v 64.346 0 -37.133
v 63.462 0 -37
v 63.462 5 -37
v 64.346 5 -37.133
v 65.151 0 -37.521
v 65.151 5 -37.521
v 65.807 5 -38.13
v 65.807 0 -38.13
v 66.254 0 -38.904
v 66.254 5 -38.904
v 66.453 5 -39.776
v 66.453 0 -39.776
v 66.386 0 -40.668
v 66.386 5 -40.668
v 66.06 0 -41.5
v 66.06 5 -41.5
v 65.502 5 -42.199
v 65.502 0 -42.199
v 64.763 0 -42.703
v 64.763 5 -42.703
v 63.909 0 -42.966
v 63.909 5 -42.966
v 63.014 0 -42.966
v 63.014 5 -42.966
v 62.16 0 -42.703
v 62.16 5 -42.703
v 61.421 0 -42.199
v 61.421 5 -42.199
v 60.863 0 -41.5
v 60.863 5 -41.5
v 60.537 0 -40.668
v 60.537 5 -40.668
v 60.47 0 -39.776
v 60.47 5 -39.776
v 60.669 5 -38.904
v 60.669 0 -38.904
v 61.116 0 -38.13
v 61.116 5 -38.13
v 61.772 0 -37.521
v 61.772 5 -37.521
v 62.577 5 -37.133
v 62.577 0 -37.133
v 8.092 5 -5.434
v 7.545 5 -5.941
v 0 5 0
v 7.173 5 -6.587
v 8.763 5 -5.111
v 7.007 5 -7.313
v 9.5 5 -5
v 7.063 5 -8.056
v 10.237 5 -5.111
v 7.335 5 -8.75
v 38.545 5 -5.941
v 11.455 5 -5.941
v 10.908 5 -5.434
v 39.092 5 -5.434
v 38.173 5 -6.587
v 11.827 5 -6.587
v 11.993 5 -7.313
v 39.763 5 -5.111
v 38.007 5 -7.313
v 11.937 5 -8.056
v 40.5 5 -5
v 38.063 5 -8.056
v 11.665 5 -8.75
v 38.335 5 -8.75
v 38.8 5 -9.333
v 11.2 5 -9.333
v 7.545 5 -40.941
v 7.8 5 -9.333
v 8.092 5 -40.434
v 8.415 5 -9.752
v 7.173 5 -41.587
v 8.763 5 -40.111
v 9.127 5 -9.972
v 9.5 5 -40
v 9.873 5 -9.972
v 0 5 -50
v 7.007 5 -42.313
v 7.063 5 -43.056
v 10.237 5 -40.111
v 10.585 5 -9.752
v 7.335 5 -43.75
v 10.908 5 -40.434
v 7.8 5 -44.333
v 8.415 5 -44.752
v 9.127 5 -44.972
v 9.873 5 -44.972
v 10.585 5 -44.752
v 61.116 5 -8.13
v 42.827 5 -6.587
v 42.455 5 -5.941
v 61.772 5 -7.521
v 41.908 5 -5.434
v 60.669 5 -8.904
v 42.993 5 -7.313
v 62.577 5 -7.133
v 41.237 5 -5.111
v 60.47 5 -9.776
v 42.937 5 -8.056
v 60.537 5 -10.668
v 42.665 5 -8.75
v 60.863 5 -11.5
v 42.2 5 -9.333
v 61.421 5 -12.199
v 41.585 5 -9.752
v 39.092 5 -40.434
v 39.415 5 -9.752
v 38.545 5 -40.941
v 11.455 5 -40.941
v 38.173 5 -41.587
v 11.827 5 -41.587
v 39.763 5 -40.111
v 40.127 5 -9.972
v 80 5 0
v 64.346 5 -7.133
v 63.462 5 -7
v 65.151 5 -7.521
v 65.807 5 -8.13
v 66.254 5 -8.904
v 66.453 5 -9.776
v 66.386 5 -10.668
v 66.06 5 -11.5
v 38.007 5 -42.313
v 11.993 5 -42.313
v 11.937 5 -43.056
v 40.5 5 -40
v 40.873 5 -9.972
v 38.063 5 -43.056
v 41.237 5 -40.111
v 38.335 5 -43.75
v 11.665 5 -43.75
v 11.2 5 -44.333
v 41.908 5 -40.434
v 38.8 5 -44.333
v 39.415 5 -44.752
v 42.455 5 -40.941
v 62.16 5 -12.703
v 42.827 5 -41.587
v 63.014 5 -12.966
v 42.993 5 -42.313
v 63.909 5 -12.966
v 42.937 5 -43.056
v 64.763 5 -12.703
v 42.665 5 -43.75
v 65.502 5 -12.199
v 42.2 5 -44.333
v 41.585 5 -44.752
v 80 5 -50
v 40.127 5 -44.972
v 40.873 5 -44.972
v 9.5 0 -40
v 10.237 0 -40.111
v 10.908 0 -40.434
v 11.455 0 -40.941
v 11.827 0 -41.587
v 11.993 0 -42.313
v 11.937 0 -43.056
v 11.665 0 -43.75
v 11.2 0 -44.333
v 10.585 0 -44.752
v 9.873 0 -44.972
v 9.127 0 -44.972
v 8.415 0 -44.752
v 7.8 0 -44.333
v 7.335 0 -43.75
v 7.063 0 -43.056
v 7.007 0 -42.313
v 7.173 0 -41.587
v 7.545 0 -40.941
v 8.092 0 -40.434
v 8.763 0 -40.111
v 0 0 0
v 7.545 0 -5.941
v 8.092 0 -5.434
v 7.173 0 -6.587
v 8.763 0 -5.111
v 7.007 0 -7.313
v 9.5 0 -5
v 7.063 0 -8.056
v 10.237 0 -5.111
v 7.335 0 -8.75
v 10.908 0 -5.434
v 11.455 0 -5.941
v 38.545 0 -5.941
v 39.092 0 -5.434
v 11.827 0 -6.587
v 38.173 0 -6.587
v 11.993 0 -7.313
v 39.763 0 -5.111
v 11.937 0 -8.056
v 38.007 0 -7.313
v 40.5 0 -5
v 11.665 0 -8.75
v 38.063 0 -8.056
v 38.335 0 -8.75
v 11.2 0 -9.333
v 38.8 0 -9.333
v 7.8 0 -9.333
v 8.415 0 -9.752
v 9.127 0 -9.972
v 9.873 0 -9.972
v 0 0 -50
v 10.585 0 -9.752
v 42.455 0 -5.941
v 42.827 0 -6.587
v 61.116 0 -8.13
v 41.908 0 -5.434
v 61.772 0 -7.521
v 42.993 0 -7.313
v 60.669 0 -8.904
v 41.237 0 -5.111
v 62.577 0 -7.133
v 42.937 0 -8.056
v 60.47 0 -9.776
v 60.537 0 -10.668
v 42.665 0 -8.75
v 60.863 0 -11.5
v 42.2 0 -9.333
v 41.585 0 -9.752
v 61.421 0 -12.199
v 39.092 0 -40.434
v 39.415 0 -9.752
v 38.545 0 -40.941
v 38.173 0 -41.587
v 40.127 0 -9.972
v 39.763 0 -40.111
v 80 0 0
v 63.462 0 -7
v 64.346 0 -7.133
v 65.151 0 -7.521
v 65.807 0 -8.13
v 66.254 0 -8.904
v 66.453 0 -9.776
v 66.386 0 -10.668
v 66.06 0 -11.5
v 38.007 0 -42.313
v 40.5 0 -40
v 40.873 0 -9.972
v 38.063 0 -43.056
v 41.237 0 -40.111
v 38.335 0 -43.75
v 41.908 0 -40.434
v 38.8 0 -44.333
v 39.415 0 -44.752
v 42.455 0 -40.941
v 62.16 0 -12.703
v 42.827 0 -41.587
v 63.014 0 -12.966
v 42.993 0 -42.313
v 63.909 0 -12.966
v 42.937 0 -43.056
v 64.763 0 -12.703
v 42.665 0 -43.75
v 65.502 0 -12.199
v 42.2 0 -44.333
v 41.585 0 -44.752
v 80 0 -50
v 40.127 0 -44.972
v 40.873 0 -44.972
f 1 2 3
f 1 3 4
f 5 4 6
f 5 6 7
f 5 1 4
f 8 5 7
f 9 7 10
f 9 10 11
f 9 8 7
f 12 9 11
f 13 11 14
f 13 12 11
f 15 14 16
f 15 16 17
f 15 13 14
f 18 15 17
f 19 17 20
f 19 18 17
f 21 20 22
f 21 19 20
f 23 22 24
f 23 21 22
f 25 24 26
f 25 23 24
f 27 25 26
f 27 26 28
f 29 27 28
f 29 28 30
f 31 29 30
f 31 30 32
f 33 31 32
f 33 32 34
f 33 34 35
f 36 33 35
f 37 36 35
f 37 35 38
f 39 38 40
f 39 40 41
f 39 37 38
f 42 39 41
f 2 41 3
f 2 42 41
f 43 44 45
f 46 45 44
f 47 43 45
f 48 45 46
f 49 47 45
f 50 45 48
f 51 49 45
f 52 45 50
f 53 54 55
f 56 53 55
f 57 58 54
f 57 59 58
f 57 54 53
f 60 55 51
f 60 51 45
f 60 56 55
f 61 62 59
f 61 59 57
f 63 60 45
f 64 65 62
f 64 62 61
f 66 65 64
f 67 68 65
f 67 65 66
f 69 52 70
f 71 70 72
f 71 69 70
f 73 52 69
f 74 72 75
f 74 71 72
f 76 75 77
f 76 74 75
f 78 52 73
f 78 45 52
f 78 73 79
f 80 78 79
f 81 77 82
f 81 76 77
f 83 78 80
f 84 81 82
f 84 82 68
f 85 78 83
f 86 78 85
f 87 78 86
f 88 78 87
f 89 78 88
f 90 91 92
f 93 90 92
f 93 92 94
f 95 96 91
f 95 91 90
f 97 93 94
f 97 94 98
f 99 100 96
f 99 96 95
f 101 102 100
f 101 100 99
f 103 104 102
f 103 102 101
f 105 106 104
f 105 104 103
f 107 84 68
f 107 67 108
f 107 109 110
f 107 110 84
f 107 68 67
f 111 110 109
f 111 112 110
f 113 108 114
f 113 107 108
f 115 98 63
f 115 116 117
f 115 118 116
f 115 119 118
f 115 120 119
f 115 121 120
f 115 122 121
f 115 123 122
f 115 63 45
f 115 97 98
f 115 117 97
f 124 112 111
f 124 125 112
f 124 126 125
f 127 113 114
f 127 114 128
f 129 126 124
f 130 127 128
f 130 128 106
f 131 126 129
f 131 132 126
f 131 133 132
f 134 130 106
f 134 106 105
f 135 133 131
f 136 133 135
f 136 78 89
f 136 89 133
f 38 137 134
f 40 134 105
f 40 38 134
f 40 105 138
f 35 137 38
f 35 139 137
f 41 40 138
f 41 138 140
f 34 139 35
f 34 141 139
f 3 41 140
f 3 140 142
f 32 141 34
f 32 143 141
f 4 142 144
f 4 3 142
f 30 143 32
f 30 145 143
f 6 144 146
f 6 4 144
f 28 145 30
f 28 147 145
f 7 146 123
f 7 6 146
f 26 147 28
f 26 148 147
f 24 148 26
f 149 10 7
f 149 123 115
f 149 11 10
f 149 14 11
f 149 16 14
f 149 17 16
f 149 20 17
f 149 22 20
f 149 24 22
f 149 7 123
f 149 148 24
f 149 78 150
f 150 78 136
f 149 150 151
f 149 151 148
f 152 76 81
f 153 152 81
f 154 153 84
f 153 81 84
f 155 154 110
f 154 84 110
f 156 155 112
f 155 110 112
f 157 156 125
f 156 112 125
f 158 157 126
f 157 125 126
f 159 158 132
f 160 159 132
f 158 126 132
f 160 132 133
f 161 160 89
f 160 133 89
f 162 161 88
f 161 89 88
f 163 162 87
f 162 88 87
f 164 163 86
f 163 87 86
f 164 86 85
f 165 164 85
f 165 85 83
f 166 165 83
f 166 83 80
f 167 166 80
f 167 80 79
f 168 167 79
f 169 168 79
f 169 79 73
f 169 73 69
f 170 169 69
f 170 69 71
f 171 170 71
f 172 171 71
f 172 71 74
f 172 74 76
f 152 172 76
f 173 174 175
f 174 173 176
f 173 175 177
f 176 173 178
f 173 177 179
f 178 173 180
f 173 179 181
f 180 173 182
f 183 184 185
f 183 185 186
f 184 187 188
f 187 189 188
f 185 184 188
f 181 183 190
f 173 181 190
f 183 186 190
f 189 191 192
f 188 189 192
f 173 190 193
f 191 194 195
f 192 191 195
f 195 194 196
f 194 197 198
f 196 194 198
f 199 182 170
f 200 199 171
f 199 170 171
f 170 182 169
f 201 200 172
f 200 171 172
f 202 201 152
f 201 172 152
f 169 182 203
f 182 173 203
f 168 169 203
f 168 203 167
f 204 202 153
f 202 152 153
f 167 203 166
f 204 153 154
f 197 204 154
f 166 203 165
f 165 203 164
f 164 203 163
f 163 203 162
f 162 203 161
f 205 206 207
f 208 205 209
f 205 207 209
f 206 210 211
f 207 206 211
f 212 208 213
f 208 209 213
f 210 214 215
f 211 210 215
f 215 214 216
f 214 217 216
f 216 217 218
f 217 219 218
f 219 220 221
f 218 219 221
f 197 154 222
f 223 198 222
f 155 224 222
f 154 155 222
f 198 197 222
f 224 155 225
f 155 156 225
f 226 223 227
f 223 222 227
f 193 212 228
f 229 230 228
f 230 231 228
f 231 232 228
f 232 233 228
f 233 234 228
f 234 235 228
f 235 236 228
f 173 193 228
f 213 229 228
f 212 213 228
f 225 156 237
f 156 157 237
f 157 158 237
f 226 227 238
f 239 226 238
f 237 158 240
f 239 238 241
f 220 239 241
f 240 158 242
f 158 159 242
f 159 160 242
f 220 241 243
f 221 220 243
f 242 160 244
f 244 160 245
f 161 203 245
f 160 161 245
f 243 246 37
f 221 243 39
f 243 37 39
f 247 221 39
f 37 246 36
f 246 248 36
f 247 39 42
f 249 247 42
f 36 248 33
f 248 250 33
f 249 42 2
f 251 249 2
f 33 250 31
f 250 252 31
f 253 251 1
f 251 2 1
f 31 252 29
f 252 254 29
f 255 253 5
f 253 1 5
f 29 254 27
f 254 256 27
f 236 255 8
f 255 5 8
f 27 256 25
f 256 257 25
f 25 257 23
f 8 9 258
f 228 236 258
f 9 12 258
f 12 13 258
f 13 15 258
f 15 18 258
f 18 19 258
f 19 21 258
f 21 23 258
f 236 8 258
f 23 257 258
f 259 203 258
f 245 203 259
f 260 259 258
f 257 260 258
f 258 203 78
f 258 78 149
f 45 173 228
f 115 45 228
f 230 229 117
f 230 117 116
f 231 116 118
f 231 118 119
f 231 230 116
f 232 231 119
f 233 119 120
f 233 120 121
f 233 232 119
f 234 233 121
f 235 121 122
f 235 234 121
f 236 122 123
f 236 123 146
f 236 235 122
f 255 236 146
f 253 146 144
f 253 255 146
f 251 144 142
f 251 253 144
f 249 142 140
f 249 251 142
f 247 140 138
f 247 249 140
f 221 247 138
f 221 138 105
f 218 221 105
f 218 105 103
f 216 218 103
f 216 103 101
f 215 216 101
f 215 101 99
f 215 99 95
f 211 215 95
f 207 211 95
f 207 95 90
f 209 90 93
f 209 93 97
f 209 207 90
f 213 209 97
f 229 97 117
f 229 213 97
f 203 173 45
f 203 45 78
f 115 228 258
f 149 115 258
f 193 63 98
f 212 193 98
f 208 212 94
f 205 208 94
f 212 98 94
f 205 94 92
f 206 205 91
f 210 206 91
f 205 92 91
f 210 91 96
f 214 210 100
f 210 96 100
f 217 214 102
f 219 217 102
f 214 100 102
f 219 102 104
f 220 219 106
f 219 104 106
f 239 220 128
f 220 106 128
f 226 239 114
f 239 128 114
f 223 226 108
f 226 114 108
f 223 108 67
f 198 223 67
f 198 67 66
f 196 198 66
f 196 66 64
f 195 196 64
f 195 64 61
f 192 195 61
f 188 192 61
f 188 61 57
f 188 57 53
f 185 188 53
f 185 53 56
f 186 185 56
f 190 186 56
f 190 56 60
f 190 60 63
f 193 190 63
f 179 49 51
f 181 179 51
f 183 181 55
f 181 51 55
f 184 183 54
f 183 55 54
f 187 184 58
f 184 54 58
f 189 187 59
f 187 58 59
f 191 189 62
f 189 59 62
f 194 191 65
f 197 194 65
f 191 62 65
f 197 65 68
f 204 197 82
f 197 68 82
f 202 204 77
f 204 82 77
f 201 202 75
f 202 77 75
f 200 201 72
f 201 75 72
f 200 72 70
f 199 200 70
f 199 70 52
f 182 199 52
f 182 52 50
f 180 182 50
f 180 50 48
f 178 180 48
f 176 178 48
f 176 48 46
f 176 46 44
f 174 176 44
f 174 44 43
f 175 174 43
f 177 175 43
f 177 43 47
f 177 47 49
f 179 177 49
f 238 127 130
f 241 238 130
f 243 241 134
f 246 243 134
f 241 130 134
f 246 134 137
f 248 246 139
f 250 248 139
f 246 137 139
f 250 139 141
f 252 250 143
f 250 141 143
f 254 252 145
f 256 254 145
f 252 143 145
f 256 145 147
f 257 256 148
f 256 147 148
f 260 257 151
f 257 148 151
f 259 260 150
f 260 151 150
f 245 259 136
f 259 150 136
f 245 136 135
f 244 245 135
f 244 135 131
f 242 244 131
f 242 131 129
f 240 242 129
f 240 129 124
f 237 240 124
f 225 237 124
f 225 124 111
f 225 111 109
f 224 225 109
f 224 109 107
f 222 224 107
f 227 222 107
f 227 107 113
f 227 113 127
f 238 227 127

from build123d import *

# Parameters (mm, degrees)
SKETCH2_W           = 80
SKETCH2_H           = 50
SKETCH2_R           = 3
BOSS_EXTRUDE1_DEPTH = 5
SKETCH3_R           = 2.5
CUT_EXTRUDE1_DEPTH  = 10


with BuildPart() as part:
    # Sketch2 → Boss-Extrude1 (new body)
    with BuildSketch(Plane(origin=(0, 0, 0), x_dir=(1, 0, 0), z_dir=(0, 1, 0))):
        with Locations((40, 25)):
            Rectangle(SKETCH2_W, SKETCH2_H)
        with Locations(Location((63.461538462, 10, 0), (0, 0, 270))):
            Circle(SKETCH2_R, mode=Mode.SUBTRACT)
        with Locations(Location((63.461538462, 40, 0), (0, 0, 270))):
            Circle(SKETCH2_R, mode=Mode.SUBTRACT)
    extrude(amount=BOSS_EXTRUDE1_DEPTH)

    # Sketch3 → Cut-Extrude1 (cut)
    with BuildSketch(Plane(origin=(0, 5, 0), x_dir=(1, 0, 0), z_dir=(0, 1, 0))):
        with Locations(Location((40.5, 7.5, 0), (0, 0, 270))):
            Circle(SKETCH3_R)
        with Locations(Location((9.5, 7.5, 0), (0, 0, 270))):
            Circle(SKETCH3_R)
        with Locations(Location((40.5, 42.5, 0), (0, 0, 270))):
            Circle(SKETCH3_R)
        with Locations(Location((9.5, 42.5, 0), (0, 0, 270))):
            Circle(SKETCH3_R)
    extrude(amount=-CUT_EXTRUDE1_DEPTH, mode=Mode.SUBTRACT)


solid = part.part
